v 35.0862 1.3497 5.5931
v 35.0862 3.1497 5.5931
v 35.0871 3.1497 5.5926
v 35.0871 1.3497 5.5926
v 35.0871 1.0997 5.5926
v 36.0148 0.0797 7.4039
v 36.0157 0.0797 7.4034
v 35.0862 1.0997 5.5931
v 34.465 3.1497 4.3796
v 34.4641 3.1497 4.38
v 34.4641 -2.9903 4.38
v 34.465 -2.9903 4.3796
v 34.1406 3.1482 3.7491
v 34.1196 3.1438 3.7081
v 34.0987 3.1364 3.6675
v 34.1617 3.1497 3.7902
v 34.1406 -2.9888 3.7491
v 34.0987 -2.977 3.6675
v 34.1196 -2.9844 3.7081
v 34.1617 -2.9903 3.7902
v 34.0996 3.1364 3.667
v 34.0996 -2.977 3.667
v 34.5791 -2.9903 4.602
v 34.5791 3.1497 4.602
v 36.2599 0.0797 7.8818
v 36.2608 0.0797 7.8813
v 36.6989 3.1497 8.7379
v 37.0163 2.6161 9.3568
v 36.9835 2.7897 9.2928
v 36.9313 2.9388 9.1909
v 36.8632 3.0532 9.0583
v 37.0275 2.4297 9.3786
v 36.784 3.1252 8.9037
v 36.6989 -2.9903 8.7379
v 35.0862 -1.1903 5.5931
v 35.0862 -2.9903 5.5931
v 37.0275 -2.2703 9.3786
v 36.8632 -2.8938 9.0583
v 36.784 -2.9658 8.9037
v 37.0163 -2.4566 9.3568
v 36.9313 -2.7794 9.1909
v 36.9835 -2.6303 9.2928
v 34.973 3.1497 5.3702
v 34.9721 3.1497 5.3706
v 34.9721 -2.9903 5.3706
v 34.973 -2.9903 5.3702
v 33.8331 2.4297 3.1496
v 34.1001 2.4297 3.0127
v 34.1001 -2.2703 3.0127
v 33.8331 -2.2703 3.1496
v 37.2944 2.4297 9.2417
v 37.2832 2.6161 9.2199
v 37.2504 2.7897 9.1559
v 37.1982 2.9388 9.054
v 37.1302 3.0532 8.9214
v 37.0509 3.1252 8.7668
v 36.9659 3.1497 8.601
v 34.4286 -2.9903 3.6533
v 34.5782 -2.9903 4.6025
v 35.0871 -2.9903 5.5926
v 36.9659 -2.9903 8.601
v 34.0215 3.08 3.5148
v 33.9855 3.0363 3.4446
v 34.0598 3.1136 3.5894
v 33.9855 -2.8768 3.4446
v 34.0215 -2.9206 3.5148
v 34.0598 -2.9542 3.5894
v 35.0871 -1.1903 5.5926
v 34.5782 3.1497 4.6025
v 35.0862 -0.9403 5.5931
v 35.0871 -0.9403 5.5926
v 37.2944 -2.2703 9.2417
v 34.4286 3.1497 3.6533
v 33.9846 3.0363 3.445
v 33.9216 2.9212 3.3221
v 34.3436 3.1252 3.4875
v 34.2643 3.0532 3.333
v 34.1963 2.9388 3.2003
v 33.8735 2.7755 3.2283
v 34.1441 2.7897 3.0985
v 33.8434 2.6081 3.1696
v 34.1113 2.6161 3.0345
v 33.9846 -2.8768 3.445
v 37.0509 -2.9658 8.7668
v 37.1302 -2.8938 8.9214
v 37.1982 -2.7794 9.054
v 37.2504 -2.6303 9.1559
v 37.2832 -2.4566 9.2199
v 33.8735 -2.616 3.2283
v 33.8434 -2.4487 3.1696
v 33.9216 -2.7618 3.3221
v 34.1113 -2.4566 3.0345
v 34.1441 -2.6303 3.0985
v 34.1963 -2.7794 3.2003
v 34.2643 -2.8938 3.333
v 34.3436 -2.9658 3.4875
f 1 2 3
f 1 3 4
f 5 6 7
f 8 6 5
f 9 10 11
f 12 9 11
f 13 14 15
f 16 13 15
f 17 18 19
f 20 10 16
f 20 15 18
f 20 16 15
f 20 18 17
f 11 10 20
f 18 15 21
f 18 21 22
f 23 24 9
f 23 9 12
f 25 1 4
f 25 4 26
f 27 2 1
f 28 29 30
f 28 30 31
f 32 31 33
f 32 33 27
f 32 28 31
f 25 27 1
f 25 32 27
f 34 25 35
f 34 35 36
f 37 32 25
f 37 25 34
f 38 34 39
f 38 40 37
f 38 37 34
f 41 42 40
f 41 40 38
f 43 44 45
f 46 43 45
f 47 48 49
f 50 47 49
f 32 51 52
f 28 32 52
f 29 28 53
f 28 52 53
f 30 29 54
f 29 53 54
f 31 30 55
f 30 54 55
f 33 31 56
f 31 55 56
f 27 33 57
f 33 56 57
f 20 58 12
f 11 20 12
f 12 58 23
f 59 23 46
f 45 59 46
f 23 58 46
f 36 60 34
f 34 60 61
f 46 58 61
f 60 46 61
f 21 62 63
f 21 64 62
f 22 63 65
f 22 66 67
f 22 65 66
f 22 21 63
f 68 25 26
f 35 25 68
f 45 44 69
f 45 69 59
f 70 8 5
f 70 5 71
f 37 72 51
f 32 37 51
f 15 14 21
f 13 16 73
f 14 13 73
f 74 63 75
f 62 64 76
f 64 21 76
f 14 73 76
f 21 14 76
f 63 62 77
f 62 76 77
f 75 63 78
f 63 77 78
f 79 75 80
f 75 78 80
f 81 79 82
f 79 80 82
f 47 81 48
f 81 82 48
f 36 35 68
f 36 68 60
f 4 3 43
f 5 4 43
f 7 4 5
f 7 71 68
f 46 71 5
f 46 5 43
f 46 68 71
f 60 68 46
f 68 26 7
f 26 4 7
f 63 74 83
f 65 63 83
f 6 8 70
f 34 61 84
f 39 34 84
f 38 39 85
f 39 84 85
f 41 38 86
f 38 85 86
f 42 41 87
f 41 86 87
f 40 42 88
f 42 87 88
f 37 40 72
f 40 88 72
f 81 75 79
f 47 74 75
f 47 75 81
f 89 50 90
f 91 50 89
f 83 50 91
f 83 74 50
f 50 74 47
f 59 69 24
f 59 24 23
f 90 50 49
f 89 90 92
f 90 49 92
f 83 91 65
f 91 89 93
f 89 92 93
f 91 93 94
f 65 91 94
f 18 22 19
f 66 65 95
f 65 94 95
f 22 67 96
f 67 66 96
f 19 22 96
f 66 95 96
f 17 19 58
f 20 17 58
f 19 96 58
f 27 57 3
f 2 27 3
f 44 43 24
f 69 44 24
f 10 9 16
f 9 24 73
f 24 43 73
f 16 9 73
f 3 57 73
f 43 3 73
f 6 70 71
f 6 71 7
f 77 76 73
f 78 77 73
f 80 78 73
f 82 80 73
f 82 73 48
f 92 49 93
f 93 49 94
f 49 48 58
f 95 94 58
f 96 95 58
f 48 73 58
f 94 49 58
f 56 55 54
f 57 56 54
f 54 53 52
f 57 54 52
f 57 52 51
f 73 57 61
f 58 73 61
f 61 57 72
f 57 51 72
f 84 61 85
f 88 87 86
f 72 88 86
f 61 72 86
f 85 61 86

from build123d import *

# Parameters (mm, degrees)
PAD003_DEPTH    = 0.3
SKETCH013_W     = 6.14
SKETCH013_H     = 0.25
POCKET009_DEPTH = 0.001
POCKET010_DEPTH = 0.001


with BuildPart() as part:
    # Sketch012 (on Face1 of Binder003) → Pad003 (new body)
    with BuildSketch(Plane(origin=(25.7763153586, 0, -13.2186232608), x_dir=(0, -1, 0), z_dir=(-0.8898174628, 0, 0.4563166476))):
        with BuildLine():
            Line((-3.1497057125, 24.5214914082), (-3.1497057125, 18.9611513515))
            ThreePointArc((-3.1497057125, 18.9611513515), (-2.9388225949, 18.452034469), (-2.4297057125, 18.2411513515))
            Line((-2.4297057125, 18.2411513515), (2.2702942875, 18.2411513515))
            ThreePointArc((2.2702942875, 18.2411513515), (2.77941117, 18.452034469), (2.9902942875, 18.9611513515))
            Line((2.9902942875, 18.9611513515), (2.9902942875, 24.5214914082))
            ThreePointArc((2.9902942875, 24.5214914082), (2.77941117, 25.0306082907), (2.2702942875, 25.2414914082))
            Line((2.2702942875, 25.2414914082), (-2.4297057125, 25.2414914082))
            ThreePointArc((-2.4297057125, 25.2414914082), (-2.9388225949, 25.0306082907), (-3.1497057125, 24.5214914082))
        make_face()
    extrude(amount=PAD003_DEPTH)

    # Sketch013 (on Face10 of Pad003) → Pocket009 (cut)
    with BuildSketch(Plane(origin=(25.5093701197, 0, -13.0817282665), x_dir=(0, -1, 0), z_dir=(-0.8898174628, 0, 0.4563166476))):
        with Locations((-0.0797057125, 19.748978)):
            Rectangle(SKETCH013_W, SKETCH013_H)
        with Locations((-0.0797057125, 18.698219)):
            Rectangle(SKETCH013_W, SKETCH013_H)
        with Locations((-0.0797057125, 20.86224)):
            Rectangle(SKETCH013_W, SKETCH013_H)
    extrude(amount=-POCKET009_DEPTH, mode=Mode.SUBTRACT)

    # Sketch014 (on Face12 of Pocket009) → Pocket010 (cut)
    with BuildSketch(Plane(origin=(25.5093701197, 0, -13.0817282665), x_dir=(0, -1, 0), z_dir=(-0.8898174628, 0, 0.4563166476))):
        Polygon((-1.0997057125, 20.98724), (-1.3497057125, 20.98724), (-0.0797057125, 23.55931), (1.1902942875, 20.98724), (0.9402942875, 20.98724), (-0.0797057125, 23.022278), align=None)
    extrude(amount=-POCKET010_DEPTH, mode=Mode.SUBTRACT)


solid = part.part
